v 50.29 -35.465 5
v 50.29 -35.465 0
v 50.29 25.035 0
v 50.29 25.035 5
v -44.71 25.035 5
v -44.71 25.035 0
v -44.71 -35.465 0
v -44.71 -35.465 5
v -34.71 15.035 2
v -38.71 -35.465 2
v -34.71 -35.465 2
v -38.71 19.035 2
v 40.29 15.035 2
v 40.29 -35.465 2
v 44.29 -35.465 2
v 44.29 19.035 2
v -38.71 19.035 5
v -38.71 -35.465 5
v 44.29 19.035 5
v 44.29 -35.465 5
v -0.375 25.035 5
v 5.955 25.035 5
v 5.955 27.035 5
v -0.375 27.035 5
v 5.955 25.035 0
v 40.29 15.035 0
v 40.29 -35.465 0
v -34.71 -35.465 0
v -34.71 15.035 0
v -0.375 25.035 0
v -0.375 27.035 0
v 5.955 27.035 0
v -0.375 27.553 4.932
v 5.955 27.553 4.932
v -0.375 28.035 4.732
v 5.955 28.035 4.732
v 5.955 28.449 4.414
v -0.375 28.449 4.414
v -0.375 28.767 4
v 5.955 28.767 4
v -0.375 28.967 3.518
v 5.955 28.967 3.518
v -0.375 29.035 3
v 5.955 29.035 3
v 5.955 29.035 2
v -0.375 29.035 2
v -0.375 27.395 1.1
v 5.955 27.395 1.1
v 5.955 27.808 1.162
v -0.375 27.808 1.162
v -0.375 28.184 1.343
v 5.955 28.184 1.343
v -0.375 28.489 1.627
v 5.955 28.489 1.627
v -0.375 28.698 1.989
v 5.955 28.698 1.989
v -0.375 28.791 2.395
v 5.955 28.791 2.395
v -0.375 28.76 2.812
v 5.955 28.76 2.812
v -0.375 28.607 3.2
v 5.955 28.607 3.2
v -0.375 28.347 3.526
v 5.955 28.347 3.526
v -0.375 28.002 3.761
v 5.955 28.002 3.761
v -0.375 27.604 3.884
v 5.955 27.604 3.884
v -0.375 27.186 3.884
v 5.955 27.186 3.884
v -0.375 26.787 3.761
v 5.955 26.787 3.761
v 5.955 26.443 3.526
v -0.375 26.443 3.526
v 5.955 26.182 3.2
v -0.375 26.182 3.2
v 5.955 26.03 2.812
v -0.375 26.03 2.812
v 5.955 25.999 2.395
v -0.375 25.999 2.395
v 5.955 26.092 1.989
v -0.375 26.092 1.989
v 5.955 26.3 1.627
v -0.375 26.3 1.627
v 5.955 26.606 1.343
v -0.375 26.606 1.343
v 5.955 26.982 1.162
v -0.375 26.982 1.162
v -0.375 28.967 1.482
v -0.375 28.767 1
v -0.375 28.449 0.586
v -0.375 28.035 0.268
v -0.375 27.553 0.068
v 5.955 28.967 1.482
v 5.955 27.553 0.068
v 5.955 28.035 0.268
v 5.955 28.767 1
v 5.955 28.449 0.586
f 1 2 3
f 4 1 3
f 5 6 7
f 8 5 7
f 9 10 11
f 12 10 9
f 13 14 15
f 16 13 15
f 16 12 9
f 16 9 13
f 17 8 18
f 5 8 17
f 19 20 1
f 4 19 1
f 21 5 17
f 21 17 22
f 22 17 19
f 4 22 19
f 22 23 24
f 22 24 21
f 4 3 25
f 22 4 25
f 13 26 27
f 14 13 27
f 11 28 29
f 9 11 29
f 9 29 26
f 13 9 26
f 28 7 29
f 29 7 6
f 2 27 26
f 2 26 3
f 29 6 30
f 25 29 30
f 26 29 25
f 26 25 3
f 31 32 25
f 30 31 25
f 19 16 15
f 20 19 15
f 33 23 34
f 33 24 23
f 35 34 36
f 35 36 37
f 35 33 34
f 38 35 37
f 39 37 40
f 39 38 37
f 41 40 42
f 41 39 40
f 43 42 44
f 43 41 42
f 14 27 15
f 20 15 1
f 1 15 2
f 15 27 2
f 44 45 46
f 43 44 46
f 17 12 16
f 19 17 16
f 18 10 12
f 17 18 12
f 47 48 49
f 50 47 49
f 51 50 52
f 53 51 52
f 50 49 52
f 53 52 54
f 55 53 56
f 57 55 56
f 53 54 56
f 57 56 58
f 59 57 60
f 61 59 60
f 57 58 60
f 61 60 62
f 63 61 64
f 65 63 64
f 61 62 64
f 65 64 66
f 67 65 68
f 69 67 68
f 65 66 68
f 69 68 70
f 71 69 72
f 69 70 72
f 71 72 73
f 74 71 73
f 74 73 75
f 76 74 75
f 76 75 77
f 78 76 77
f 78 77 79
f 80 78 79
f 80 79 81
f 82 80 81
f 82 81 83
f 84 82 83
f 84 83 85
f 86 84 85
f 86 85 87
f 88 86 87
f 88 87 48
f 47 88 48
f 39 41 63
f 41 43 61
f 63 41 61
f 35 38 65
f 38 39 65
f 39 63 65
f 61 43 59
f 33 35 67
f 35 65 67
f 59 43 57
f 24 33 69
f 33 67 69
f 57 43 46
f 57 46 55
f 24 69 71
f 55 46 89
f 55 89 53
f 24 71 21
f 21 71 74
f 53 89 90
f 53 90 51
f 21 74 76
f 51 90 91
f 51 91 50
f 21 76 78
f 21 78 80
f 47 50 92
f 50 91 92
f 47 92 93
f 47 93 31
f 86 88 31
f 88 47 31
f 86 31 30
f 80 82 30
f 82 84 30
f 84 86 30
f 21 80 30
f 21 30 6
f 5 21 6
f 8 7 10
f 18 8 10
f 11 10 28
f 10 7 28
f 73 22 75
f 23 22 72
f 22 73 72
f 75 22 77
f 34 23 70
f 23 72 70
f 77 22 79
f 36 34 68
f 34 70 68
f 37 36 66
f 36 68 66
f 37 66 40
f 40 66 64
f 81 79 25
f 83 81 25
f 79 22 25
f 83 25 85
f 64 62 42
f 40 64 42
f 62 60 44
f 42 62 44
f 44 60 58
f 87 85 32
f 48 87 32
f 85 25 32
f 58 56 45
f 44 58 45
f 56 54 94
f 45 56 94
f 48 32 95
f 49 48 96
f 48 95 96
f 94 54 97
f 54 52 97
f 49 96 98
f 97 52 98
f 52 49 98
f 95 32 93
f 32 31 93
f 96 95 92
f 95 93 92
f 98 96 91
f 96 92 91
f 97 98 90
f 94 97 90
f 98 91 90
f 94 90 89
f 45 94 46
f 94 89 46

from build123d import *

# Parameters (mm, degrees)
BOSS_EXTRUDE1_DEPTH = 2
BOSS_EXTRUDE2_DEPTH = 5
SKETCH2_R           = 1.4
CUT_EXTRUDE1_DEPTH  = 8
FILLET1_R           = 2


with BuildPart() as part:
    # Sketch1 → Boss-Extrude1 (new body)
    with BuildSketch(Plane.XY):
        Polygon((-38.709801473, -35.46512078), (-34.709801473, -35.46512078), (-34.709801473, 15.03487922), (40.290198527, 15.03487922), (40.290198527, -35.46512078), (44.290198527, -35.46512078), (44.290198527, 19.03487922), (-38.709801473, 19.03487922), align=None)
    extrude(amount=BOSS_EXTRUDE1_DEPTH)

    # Sketch1_4 → Boss-Extrude2 (add)
    with BuildSketch(Plane.XY):
        Polygon((-44.709801473, -35.46512078), (-38.709801473, -35.46512078), (-38.709801473, 19.03487922), (44.290198527, 19.03487922), (44.290198527, -35.46512078), (50.290198527, -35.46512078), (50.290198527, 25.03487922), (5.955198527, 25.03487922), (5.955198527, 29.03487922), (-0.374801473, 29.03487922), (-0.374801473, 25.03487922), (-44.709801473, 25.03487922), align=None)
    extrude(amount=BOSS_EXTRUDE2_DEPTH)

    # Sketch2 → Cut-Extrude1 (cut)
    with BuildSketch(Plane(origin=(5.955198527, 0, 0), x_dir=(0, 0, -1), z_dir=(1, 0, 0))):
        with Locations((-2.5, 27.39487922)):
            Circle(SKETCH2_R)
    extrude(amount=-CUT_EXTRUDE1_DEPTH, mode=Mode.SUBTRACT)

    # Fillet1
    fillet1_edges = [part.edges().sort_by_distance(p)[0] for p in [
        (2.790198527, 29.03487922, 0),
        (2.790198527, 29.03487922, 5),
    ]]
    fillet(fillet1_edges, radius=FILLET1_R)


solid = part.part
